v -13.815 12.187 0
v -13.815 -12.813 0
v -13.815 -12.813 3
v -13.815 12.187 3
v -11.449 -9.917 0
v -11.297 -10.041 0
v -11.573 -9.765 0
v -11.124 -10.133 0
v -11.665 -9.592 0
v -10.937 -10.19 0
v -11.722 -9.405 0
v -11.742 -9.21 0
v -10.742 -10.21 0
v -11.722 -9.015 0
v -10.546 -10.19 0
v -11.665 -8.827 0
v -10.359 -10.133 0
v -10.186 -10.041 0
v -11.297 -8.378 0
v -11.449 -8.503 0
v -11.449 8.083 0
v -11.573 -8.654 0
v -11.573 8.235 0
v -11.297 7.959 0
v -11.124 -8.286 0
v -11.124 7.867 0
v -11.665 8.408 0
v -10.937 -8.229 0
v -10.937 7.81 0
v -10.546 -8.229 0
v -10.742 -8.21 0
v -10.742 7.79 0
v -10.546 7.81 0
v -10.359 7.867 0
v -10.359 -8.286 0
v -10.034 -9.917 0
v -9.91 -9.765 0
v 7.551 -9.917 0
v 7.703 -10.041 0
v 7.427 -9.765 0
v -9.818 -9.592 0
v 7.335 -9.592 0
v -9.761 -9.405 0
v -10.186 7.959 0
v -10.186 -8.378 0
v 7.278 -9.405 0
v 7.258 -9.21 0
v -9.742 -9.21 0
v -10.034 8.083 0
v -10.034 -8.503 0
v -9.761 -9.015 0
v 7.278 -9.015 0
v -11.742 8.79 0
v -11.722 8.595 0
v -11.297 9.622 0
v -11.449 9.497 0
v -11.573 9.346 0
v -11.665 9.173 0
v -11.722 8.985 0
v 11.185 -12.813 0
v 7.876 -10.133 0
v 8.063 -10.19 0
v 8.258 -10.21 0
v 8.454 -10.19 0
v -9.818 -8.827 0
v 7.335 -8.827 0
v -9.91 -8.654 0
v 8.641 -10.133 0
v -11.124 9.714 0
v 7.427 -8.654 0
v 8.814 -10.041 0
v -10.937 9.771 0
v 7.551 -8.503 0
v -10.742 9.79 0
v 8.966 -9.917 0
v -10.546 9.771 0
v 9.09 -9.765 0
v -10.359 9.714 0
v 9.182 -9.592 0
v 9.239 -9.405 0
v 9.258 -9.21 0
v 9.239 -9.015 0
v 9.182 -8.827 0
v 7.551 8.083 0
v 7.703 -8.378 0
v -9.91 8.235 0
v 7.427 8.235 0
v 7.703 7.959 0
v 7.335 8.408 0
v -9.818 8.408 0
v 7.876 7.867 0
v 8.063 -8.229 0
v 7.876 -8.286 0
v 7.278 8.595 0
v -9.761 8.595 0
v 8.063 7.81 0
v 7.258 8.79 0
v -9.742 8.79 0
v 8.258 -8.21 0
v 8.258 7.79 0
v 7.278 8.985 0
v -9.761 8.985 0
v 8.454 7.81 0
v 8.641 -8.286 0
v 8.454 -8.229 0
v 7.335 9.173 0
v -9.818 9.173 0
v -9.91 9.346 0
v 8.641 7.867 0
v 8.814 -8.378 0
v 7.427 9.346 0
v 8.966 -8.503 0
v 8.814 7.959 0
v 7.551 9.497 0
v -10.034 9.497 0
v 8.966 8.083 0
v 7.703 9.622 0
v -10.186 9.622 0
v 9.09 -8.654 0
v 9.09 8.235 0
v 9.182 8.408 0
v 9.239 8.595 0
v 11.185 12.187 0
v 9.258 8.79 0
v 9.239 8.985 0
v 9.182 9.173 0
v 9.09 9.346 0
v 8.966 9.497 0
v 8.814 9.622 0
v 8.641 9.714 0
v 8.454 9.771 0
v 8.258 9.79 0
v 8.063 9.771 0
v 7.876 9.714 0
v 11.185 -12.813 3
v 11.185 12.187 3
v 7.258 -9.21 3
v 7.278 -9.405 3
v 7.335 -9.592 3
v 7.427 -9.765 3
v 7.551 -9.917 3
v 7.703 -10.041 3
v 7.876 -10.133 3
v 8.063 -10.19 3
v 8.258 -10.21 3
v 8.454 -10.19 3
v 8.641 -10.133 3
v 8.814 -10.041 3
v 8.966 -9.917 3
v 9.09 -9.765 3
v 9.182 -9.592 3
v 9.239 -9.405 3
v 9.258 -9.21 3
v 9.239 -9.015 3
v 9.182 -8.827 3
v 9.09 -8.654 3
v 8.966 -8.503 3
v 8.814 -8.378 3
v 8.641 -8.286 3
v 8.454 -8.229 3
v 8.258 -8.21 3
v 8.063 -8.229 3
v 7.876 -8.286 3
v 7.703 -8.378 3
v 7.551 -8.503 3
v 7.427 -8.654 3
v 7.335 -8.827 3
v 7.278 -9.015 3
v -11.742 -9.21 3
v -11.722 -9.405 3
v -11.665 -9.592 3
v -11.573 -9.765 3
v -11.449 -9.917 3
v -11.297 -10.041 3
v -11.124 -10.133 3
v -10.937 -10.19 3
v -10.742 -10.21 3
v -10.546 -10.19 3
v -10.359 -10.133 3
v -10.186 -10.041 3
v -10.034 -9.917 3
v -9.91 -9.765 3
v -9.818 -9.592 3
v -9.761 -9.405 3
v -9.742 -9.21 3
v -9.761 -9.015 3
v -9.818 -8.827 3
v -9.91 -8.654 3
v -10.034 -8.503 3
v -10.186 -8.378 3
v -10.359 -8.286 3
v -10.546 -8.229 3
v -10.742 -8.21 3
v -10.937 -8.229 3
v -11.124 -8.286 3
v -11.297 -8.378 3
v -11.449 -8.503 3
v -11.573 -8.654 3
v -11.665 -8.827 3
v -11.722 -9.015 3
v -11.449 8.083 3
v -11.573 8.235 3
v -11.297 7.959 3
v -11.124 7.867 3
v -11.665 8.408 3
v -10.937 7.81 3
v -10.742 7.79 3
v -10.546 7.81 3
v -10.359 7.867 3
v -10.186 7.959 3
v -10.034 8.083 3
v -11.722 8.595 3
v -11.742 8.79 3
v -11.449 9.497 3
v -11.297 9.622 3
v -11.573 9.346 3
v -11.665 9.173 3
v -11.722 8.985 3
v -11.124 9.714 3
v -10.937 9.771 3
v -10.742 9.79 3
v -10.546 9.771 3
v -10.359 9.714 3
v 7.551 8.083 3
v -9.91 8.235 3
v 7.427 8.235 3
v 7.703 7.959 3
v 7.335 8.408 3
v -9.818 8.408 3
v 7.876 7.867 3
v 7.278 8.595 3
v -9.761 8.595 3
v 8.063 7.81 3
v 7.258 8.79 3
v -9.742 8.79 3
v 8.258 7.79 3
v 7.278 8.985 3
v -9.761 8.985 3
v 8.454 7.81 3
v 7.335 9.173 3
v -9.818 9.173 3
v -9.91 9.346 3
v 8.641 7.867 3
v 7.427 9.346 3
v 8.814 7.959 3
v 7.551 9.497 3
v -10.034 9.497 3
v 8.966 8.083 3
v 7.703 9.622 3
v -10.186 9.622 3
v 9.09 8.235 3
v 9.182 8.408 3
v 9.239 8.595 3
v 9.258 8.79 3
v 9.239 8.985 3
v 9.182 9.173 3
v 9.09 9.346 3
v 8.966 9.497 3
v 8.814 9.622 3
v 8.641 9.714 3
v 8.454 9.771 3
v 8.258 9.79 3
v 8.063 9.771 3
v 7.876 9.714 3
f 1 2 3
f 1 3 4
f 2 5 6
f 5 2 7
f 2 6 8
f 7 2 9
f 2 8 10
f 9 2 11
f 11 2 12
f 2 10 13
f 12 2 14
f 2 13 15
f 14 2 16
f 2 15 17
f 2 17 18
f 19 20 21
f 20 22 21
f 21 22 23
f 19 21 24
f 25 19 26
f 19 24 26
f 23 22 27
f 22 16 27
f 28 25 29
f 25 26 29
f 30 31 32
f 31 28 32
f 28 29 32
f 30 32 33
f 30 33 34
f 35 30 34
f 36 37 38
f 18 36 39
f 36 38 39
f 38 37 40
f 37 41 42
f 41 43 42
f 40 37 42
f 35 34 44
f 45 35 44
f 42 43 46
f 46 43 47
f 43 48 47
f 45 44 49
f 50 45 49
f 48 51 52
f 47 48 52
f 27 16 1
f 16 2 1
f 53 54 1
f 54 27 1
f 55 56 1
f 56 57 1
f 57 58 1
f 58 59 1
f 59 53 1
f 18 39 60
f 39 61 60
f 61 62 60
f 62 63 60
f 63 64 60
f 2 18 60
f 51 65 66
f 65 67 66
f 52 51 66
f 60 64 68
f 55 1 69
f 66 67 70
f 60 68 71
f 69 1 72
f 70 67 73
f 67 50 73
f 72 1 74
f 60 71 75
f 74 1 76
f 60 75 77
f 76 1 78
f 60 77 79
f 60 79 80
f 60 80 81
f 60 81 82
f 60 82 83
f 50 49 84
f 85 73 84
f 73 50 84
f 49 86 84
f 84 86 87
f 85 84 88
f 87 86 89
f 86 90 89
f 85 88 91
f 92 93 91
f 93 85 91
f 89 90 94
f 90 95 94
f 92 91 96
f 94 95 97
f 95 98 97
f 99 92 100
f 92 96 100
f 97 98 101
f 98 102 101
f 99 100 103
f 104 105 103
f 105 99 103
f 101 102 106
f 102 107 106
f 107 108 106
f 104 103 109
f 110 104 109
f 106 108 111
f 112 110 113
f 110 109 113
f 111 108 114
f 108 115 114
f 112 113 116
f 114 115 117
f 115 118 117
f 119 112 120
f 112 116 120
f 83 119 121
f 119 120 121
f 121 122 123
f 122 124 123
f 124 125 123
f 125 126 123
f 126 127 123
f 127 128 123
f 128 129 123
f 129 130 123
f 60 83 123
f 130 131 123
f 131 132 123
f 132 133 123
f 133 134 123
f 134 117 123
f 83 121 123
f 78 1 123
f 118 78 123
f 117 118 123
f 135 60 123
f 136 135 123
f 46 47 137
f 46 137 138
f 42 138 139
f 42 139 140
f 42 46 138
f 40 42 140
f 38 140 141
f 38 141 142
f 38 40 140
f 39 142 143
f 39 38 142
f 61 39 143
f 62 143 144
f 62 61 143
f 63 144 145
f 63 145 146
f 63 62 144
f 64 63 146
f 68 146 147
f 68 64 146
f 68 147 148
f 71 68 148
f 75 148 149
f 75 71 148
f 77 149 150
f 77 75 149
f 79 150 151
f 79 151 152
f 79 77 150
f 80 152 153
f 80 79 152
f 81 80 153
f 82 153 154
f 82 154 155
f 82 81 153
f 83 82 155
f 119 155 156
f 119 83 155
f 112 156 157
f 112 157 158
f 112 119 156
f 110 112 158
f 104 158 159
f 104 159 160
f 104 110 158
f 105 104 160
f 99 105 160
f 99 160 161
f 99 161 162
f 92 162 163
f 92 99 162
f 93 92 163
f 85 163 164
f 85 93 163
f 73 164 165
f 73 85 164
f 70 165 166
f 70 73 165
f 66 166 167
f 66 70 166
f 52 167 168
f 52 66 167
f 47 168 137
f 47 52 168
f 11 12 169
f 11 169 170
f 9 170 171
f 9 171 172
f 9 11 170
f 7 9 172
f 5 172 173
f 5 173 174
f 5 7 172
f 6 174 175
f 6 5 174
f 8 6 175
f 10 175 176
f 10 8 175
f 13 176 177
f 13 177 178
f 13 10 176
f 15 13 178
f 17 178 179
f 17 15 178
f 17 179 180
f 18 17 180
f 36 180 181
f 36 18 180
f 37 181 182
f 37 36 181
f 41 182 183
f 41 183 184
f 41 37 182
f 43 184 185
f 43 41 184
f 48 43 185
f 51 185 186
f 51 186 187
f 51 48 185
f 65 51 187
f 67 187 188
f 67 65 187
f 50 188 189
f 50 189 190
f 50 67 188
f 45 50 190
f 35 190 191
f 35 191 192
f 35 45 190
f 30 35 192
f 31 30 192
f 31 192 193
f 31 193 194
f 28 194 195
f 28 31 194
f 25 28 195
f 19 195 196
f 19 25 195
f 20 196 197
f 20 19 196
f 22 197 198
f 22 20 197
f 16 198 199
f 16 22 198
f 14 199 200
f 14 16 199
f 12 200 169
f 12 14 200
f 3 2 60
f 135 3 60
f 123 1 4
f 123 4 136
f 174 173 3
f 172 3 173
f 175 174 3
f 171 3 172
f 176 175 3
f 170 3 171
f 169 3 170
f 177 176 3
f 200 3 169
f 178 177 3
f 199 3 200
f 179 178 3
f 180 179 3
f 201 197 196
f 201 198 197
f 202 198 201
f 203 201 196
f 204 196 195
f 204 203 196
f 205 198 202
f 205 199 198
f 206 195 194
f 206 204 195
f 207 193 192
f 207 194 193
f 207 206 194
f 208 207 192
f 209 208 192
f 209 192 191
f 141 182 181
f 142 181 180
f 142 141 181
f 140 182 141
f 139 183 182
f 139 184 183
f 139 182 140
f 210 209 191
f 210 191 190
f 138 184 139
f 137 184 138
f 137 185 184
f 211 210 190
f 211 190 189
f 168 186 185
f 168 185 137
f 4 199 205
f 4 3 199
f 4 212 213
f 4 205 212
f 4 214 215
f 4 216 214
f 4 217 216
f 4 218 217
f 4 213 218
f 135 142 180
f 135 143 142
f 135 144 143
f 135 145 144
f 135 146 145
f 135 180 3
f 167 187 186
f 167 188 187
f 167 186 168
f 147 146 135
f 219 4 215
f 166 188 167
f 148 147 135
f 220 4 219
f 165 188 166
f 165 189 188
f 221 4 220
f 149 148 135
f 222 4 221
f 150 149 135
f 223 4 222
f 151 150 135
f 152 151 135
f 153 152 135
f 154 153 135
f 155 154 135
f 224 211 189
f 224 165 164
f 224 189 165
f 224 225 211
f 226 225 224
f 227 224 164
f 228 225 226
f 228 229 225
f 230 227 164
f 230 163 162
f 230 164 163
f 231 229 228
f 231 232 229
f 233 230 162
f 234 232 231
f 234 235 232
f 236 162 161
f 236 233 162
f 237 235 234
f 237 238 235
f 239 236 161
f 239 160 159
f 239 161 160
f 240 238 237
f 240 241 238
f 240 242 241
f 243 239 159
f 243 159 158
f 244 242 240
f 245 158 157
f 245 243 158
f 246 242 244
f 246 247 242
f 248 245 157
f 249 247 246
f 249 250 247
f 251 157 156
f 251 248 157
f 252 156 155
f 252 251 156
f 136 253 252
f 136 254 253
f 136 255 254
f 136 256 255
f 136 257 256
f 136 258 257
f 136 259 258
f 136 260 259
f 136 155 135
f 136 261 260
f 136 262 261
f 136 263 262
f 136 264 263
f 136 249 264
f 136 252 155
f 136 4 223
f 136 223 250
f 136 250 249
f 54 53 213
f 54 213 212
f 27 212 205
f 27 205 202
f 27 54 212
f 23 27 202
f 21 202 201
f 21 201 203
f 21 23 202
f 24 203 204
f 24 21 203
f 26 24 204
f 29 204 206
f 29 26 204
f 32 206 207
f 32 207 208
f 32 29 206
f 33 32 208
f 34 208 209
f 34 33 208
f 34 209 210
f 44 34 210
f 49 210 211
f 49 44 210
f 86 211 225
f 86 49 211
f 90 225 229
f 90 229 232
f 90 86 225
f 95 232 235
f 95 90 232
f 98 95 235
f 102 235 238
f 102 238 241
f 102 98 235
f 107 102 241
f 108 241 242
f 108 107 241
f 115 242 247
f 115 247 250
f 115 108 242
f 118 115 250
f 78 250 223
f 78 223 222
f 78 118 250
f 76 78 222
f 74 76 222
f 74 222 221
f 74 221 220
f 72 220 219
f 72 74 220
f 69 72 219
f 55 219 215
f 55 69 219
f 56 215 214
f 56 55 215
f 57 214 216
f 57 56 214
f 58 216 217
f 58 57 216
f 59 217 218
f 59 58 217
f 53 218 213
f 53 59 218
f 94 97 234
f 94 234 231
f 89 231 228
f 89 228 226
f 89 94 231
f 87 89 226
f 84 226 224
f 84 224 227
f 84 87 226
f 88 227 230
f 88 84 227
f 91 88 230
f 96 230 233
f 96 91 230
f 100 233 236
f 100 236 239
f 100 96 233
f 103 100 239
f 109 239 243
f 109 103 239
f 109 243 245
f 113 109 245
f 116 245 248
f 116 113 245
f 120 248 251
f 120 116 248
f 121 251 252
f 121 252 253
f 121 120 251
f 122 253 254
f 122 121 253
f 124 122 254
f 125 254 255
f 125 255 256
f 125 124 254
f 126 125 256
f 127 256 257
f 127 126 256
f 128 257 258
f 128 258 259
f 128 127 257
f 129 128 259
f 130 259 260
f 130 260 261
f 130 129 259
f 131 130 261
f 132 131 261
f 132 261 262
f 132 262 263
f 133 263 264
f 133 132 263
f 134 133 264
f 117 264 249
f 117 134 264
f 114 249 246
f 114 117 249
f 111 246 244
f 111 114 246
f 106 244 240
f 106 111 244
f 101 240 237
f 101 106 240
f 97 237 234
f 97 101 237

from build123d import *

# Parameters (mm, degrees)
ESQUISSE1_W        = 25
ESQUISSE1_H        = 25
ESQUISSE1_R        = 1
BOSS_EXTRU_1_DEPTH = 3


with BuildPart() as part:
    # Esquisse1 → Boss.-Extru.1 (new body)
    with BuildSketch(Plane.XY):
        with Locations((-1.315129748, -0.313430953)):
            Rectangle(ESQUISSE1_W, ESQUISSE1_H)
        with Locations(Location((-10.74158344, -9.209614493, 0), (0, 0, 180))):
            Circle(ESQUISSE1_R, mode=Mode.SUBTRACT)
        with Locations(Location((-10.74158344, 8.790385507, 0), (0, 0, 180))):
            Circle(ESQUISSE1_R, mode=Mode.SUBTRACT)
        with Locations(Location((8.25841656, -9.209614493, 0), (0, 0, 180))):
            Circle(ESQUISSE1_R, mode=Mode.SUBTRACT)
        with Locations(Location((8.25841656, 8.790385507, 0), (0, 0, 180))):
            Circle(ESQUISSE1_R, mode=Mode.SUBTRACT)
    extrude(amount=BOSS_EXTRU_1_DEPTH)


solid = part.part
